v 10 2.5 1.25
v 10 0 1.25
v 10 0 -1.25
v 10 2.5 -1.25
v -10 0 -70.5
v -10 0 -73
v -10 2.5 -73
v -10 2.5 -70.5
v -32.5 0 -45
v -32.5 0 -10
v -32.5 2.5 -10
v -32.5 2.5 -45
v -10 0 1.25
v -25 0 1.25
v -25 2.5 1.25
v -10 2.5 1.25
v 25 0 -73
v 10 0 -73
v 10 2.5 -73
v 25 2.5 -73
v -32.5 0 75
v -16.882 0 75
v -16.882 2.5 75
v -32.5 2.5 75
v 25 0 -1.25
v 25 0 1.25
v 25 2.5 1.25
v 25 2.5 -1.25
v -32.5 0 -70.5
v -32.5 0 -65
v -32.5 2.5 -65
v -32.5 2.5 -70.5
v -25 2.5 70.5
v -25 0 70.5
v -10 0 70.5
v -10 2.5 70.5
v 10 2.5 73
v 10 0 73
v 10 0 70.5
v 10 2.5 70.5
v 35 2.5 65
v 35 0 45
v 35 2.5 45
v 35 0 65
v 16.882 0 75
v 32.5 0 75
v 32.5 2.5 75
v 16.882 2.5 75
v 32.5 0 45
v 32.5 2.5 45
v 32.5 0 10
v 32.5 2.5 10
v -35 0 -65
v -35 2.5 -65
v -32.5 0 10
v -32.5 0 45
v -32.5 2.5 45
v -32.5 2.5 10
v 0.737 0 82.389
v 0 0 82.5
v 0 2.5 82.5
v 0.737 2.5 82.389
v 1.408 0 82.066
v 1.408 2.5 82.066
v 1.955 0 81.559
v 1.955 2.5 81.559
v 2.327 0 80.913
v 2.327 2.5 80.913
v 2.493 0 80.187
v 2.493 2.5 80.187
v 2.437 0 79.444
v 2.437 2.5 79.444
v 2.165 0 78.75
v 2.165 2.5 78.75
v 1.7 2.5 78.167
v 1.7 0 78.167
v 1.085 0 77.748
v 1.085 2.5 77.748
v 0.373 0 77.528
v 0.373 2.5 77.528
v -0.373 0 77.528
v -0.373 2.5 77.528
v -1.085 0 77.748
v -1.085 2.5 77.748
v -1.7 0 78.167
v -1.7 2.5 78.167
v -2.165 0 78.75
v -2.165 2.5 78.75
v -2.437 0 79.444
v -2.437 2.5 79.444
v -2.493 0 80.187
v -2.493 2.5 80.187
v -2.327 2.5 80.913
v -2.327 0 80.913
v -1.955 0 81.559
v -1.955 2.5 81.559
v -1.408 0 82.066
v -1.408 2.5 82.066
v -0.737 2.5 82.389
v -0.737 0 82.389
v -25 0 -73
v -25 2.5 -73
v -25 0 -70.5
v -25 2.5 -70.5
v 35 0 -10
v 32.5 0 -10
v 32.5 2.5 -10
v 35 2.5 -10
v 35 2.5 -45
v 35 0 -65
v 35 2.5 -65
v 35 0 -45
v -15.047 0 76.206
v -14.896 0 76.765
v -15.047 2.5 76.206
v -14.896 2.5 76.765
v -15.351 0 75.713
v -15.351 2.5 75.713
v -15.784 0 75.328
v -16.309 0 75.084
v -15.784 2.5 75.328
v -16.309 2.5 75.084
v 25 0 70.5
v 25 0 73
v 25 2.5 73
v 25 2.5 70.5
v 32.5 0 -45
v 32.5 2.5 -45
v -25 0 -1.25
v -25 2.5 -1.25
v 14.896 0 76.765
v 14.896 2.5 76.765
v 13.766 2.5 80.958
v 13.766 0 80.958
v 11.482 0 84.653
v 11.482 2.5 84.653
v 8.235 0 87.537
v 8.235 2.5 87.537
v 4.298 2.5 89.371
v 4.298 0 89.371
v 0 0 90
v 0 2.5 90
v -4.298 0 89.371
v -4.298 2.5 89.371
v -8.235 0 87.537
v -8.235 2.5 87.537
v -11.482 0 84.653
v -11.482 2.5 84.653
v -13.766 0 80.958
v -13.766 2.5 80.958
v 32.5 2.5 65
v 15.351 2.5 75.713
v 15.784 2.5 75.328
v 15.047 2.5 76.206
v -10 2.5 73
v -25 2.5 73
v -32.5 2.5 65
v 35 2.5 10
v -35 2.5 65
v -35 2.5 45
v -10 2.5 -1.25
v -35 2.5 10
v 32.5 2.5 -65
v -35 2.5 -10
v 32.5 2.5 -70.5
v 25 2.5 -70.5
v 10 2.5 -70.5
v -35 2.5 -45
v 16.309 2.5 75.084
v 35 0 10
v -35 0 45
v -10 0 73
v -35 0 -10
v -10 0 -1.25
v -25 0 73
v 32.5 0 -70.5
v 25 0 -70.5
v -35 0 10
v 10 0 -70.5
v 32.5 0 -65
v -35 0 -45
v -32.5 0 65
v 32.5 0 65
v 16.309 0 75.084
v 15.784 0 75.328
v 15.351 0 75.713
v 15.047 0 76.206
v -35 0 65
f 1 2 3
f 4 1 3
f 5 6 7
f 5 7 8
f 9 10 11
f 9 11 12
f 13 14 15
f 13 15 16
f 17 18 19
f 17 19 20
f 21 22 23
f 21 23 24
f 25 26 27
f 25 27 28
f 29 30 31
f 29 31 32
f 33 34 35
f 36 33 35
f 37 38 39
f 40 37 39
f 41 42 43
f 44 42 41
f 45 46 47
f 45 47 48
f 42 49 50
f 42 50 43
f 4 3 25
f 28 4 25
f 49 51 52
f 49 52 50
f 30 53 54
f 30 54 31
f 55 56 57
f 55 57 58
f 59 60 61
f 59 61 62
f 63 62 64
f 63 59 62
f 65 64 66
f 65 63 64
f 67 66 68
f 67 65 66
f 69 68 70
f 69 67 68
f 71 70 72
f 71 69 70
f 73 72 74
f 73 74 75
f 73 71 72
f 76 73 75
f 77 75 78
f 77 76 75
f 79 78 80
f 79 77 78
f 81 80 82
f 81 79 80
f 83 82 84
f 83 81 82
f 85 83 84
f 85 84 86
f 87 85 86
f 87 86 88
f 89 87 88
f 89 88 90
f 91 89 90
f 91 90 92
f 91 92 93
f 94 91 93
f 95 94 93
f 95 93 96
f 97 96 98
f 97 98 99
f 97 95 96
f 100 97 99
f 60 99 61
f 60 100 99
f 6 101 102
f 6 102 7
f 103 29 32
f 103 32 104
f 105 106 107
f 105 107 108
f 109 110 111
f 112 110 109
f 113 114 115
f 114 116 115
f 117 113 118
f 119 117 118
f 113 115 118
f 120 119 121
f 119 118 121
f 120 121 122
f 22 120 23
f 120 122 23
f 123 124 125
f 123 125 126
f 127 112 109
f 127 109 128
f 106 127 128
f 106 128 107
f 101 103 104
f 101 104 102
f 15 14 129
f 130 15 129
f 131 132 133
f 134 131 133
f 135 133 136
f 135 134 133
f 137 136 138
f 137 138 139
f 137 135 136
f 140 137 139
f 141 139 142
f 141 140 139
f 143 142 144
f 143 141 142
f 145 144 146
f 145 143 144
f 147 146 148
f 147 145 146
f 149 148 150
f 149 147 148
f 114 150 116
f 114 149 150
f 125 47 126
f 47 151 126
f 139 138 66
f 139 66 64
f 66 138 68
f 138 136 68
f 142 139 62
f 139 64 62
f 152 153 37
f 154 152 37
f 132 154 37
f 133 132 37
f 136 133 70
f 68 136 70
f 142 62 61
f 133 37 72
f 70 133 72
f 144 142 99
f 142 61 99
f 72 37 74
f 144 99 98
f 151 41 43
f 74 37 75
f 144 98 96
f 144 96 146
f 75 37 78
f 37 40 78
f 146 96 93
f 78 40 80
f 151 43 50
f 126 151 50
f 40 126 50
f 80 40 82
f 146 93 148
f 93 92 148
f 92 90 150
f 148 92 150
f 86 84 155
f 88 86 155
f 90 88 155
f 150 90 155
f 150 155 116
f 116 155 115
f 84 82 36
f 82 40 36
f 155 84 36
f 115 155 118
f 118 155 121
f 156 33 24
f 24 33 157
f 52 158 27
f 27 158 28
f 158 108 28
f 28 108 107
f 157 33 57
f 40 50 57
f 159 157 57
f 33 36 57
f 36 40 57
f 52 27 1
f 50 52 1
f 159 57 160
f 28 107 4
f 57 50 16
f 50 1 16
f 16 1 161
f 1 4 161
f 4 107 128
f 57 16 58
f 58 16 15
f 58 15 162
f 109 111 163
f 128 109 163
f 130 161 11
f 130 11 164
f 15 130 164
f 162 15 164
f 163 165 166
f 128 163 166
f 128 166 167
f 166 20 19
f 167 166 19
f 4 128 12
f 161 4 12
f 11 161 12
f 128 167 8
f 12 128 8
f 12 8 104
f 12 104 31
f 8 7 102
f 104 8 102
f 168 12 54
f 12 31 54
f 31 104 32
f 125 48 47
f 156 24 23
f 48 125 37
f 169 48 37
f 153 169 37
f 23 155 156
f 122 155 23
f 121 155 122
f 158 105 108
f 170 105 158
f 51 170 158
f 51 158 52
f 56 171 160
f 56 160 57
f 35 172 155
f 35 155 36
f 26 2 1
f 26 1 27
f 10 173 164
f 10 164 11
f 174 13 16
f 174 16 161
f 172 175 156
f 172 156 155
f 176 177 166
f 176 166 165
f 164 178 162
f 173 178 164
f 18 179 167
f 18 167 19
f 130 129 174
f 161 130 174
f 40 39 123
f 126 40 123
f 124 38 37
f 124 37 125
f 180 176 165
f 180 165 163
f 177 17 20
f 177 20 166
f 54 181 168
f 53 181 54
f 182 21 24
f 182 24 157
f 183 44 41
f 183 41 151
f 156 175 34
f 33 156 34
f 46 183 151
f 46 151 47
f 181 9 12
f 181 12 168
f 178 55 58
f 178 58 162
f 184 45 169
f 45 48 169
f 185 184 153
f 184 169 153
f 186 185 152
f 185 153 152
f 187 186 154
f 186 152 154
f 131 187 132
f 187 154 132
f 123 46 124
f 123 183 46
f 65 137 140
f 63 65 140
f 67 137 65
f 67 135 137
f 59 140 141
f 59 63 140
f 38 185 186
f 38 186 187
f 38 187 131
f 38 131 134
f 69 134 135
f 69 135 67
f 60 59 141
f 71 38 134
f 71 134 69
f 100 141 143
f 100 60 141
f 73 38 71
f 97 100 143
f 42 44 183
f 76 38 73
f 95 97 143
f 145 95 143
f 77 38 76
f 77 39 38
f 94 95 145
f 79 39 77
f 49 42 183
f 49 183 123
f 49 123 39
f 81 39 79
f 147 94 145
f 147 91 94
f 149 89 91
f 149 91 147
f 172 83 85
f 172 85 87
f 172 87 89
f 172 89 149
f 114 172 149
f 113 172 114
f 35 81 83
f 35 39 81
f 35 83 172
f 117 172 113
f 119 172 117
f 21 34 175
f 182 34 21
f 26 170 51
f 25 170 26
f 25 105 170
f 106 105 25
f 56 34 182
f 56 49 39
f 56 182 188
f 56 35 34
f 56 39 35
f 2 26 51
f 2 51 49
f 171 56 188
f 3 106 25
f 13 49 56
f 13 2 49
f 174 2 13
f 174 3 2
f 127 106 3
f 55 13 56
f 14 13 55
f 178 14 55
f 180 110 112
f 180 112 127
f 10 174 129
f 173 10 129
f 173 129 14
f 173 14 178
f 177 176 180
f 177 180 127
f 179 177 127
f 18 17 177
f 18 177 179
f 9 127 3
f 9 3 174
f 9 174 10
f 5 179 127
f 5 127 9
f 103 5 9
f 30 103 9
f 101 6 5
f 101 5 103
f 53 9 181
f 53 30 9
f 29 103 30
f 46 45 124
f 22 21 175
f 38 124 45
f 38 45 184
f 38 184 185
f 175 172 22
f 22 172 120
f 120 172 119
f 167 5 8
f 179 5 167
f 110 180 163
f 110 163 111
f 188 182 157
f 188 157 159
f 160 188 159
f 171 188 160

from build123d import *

# Parameters (mm, degrees)
SKETCH1_R           = 2.5
SKETCH1_W           = 15
SKETCH1_H           = 2.5
BOSS_EXTRUDE1_DEPTH = 2.5
FILLET1_R           = 2


with BuildPart() as part:
    # Sketch1 → Boss-Extrude1 (new body)
    with BuildSketch(Plane(origin=(0, 0, 0), x_dir=(1, 0, 0), z_dir=(0, 1, 0))):
        with BuildLine():
            Line((35, 45), (32.5, 45))
            Line((32.5, 45), (32.5, 10))
            Line((32.5, 10), (35, 10))
            Line((35, 10), (35, -10))
            Line((35, -10), (32.5, -10))
            Line((32.5, -10), (32.5, -45))
            Line((32.5, -45), (35, -45))
            Line((35, -45), (35, -65))
            Line((35, -65), (32.5, -65))
            Line((32.5, -65), (32.5, -75))
            Line((32.5, -75), (15, -75))
            ThreePointArc((15, -75), (0, -90), (-15, -75))
            Line((-15, -75), (-32.5, -75))
            Line((-32.5, -75), (-32.5, -65))
            Line((-32.5, -65), (-35, -65))
            Line((-35, -65), (-35, -45))
            Line((-35, -45), (-32.5, -45))
            Line((-32.5, -45), (-32.5, -10))
            Line((-32.5, -10), (-35, -10))
            Line((-35, -10), (-35, 10))
            Line((-35, 10), (-32.5, 10))
            Line((-32.5, 10), (-32.5, 45))
            Line((-32.5, 45), (-35, 45))
            Line((-35, 45), (-35, 65))
            Line((-35, 65), (-32.5, 65))
            Line((-32.5, 65), (-32.5, 70.5))
            Line((-32.5, 70.5), (-25, 70.5))
            Line((-25, 70.5), (-25, 73))
            Line((-25, 73), (-10, 73))
            Line((-10, 73), (-10, 70.5))
            Line((-10, 70.5), (10, 70.5))
            Line((10, 70.5), (10, 73))
            Line((10, 73), (25, 73))
            Line((25, 73), (25, 70.5))
            Line((25, 70.5), (32.5, 70.5))
            Line((32.5, 70.5), (32.5, 65))
            Line((32.5, 65), (35, 65))
            Line((35, 65), (35, 45))
        make_face()
        with Locations(Location((0, -80, 0), (0, 0, 270))):
            Circle(SKETCH1_R, mode=Mode.SUBTRACT)
        with Locations((17.5, 0)):
            Rectangle(SKETCH1_W, SKETCH1_H, mode=Mode.SUBTRACT)
        with Locations((-17.5, 0)):
            Rectangle(SKETCH1_W, SKETCH1_H, mode=Mode.SUBTRACT)
        with Locations((-17.5, -71.75)):
            Rectangle(SKETCH1_W, SKETCH1_H, mode=Mode.SUBTRACT)
        with Locations((17.5, -71.75)):
            Rectangle(SKETCH1_W, SKETCH1_H, mode=Mode.SUBTRACT)
    extrude(amount=BOSS_EXTRUDE1_DEPTH)

    # Fillet1
    fillet1_edges = [part.edges().sort_by_distance(p)[0] for p in [
        (15, 1.25, 75),
        (-15, 1.25, 75),
    ]]
    fillet(fillet1_edges, radius=FILLET1_R)


solid = part.part
